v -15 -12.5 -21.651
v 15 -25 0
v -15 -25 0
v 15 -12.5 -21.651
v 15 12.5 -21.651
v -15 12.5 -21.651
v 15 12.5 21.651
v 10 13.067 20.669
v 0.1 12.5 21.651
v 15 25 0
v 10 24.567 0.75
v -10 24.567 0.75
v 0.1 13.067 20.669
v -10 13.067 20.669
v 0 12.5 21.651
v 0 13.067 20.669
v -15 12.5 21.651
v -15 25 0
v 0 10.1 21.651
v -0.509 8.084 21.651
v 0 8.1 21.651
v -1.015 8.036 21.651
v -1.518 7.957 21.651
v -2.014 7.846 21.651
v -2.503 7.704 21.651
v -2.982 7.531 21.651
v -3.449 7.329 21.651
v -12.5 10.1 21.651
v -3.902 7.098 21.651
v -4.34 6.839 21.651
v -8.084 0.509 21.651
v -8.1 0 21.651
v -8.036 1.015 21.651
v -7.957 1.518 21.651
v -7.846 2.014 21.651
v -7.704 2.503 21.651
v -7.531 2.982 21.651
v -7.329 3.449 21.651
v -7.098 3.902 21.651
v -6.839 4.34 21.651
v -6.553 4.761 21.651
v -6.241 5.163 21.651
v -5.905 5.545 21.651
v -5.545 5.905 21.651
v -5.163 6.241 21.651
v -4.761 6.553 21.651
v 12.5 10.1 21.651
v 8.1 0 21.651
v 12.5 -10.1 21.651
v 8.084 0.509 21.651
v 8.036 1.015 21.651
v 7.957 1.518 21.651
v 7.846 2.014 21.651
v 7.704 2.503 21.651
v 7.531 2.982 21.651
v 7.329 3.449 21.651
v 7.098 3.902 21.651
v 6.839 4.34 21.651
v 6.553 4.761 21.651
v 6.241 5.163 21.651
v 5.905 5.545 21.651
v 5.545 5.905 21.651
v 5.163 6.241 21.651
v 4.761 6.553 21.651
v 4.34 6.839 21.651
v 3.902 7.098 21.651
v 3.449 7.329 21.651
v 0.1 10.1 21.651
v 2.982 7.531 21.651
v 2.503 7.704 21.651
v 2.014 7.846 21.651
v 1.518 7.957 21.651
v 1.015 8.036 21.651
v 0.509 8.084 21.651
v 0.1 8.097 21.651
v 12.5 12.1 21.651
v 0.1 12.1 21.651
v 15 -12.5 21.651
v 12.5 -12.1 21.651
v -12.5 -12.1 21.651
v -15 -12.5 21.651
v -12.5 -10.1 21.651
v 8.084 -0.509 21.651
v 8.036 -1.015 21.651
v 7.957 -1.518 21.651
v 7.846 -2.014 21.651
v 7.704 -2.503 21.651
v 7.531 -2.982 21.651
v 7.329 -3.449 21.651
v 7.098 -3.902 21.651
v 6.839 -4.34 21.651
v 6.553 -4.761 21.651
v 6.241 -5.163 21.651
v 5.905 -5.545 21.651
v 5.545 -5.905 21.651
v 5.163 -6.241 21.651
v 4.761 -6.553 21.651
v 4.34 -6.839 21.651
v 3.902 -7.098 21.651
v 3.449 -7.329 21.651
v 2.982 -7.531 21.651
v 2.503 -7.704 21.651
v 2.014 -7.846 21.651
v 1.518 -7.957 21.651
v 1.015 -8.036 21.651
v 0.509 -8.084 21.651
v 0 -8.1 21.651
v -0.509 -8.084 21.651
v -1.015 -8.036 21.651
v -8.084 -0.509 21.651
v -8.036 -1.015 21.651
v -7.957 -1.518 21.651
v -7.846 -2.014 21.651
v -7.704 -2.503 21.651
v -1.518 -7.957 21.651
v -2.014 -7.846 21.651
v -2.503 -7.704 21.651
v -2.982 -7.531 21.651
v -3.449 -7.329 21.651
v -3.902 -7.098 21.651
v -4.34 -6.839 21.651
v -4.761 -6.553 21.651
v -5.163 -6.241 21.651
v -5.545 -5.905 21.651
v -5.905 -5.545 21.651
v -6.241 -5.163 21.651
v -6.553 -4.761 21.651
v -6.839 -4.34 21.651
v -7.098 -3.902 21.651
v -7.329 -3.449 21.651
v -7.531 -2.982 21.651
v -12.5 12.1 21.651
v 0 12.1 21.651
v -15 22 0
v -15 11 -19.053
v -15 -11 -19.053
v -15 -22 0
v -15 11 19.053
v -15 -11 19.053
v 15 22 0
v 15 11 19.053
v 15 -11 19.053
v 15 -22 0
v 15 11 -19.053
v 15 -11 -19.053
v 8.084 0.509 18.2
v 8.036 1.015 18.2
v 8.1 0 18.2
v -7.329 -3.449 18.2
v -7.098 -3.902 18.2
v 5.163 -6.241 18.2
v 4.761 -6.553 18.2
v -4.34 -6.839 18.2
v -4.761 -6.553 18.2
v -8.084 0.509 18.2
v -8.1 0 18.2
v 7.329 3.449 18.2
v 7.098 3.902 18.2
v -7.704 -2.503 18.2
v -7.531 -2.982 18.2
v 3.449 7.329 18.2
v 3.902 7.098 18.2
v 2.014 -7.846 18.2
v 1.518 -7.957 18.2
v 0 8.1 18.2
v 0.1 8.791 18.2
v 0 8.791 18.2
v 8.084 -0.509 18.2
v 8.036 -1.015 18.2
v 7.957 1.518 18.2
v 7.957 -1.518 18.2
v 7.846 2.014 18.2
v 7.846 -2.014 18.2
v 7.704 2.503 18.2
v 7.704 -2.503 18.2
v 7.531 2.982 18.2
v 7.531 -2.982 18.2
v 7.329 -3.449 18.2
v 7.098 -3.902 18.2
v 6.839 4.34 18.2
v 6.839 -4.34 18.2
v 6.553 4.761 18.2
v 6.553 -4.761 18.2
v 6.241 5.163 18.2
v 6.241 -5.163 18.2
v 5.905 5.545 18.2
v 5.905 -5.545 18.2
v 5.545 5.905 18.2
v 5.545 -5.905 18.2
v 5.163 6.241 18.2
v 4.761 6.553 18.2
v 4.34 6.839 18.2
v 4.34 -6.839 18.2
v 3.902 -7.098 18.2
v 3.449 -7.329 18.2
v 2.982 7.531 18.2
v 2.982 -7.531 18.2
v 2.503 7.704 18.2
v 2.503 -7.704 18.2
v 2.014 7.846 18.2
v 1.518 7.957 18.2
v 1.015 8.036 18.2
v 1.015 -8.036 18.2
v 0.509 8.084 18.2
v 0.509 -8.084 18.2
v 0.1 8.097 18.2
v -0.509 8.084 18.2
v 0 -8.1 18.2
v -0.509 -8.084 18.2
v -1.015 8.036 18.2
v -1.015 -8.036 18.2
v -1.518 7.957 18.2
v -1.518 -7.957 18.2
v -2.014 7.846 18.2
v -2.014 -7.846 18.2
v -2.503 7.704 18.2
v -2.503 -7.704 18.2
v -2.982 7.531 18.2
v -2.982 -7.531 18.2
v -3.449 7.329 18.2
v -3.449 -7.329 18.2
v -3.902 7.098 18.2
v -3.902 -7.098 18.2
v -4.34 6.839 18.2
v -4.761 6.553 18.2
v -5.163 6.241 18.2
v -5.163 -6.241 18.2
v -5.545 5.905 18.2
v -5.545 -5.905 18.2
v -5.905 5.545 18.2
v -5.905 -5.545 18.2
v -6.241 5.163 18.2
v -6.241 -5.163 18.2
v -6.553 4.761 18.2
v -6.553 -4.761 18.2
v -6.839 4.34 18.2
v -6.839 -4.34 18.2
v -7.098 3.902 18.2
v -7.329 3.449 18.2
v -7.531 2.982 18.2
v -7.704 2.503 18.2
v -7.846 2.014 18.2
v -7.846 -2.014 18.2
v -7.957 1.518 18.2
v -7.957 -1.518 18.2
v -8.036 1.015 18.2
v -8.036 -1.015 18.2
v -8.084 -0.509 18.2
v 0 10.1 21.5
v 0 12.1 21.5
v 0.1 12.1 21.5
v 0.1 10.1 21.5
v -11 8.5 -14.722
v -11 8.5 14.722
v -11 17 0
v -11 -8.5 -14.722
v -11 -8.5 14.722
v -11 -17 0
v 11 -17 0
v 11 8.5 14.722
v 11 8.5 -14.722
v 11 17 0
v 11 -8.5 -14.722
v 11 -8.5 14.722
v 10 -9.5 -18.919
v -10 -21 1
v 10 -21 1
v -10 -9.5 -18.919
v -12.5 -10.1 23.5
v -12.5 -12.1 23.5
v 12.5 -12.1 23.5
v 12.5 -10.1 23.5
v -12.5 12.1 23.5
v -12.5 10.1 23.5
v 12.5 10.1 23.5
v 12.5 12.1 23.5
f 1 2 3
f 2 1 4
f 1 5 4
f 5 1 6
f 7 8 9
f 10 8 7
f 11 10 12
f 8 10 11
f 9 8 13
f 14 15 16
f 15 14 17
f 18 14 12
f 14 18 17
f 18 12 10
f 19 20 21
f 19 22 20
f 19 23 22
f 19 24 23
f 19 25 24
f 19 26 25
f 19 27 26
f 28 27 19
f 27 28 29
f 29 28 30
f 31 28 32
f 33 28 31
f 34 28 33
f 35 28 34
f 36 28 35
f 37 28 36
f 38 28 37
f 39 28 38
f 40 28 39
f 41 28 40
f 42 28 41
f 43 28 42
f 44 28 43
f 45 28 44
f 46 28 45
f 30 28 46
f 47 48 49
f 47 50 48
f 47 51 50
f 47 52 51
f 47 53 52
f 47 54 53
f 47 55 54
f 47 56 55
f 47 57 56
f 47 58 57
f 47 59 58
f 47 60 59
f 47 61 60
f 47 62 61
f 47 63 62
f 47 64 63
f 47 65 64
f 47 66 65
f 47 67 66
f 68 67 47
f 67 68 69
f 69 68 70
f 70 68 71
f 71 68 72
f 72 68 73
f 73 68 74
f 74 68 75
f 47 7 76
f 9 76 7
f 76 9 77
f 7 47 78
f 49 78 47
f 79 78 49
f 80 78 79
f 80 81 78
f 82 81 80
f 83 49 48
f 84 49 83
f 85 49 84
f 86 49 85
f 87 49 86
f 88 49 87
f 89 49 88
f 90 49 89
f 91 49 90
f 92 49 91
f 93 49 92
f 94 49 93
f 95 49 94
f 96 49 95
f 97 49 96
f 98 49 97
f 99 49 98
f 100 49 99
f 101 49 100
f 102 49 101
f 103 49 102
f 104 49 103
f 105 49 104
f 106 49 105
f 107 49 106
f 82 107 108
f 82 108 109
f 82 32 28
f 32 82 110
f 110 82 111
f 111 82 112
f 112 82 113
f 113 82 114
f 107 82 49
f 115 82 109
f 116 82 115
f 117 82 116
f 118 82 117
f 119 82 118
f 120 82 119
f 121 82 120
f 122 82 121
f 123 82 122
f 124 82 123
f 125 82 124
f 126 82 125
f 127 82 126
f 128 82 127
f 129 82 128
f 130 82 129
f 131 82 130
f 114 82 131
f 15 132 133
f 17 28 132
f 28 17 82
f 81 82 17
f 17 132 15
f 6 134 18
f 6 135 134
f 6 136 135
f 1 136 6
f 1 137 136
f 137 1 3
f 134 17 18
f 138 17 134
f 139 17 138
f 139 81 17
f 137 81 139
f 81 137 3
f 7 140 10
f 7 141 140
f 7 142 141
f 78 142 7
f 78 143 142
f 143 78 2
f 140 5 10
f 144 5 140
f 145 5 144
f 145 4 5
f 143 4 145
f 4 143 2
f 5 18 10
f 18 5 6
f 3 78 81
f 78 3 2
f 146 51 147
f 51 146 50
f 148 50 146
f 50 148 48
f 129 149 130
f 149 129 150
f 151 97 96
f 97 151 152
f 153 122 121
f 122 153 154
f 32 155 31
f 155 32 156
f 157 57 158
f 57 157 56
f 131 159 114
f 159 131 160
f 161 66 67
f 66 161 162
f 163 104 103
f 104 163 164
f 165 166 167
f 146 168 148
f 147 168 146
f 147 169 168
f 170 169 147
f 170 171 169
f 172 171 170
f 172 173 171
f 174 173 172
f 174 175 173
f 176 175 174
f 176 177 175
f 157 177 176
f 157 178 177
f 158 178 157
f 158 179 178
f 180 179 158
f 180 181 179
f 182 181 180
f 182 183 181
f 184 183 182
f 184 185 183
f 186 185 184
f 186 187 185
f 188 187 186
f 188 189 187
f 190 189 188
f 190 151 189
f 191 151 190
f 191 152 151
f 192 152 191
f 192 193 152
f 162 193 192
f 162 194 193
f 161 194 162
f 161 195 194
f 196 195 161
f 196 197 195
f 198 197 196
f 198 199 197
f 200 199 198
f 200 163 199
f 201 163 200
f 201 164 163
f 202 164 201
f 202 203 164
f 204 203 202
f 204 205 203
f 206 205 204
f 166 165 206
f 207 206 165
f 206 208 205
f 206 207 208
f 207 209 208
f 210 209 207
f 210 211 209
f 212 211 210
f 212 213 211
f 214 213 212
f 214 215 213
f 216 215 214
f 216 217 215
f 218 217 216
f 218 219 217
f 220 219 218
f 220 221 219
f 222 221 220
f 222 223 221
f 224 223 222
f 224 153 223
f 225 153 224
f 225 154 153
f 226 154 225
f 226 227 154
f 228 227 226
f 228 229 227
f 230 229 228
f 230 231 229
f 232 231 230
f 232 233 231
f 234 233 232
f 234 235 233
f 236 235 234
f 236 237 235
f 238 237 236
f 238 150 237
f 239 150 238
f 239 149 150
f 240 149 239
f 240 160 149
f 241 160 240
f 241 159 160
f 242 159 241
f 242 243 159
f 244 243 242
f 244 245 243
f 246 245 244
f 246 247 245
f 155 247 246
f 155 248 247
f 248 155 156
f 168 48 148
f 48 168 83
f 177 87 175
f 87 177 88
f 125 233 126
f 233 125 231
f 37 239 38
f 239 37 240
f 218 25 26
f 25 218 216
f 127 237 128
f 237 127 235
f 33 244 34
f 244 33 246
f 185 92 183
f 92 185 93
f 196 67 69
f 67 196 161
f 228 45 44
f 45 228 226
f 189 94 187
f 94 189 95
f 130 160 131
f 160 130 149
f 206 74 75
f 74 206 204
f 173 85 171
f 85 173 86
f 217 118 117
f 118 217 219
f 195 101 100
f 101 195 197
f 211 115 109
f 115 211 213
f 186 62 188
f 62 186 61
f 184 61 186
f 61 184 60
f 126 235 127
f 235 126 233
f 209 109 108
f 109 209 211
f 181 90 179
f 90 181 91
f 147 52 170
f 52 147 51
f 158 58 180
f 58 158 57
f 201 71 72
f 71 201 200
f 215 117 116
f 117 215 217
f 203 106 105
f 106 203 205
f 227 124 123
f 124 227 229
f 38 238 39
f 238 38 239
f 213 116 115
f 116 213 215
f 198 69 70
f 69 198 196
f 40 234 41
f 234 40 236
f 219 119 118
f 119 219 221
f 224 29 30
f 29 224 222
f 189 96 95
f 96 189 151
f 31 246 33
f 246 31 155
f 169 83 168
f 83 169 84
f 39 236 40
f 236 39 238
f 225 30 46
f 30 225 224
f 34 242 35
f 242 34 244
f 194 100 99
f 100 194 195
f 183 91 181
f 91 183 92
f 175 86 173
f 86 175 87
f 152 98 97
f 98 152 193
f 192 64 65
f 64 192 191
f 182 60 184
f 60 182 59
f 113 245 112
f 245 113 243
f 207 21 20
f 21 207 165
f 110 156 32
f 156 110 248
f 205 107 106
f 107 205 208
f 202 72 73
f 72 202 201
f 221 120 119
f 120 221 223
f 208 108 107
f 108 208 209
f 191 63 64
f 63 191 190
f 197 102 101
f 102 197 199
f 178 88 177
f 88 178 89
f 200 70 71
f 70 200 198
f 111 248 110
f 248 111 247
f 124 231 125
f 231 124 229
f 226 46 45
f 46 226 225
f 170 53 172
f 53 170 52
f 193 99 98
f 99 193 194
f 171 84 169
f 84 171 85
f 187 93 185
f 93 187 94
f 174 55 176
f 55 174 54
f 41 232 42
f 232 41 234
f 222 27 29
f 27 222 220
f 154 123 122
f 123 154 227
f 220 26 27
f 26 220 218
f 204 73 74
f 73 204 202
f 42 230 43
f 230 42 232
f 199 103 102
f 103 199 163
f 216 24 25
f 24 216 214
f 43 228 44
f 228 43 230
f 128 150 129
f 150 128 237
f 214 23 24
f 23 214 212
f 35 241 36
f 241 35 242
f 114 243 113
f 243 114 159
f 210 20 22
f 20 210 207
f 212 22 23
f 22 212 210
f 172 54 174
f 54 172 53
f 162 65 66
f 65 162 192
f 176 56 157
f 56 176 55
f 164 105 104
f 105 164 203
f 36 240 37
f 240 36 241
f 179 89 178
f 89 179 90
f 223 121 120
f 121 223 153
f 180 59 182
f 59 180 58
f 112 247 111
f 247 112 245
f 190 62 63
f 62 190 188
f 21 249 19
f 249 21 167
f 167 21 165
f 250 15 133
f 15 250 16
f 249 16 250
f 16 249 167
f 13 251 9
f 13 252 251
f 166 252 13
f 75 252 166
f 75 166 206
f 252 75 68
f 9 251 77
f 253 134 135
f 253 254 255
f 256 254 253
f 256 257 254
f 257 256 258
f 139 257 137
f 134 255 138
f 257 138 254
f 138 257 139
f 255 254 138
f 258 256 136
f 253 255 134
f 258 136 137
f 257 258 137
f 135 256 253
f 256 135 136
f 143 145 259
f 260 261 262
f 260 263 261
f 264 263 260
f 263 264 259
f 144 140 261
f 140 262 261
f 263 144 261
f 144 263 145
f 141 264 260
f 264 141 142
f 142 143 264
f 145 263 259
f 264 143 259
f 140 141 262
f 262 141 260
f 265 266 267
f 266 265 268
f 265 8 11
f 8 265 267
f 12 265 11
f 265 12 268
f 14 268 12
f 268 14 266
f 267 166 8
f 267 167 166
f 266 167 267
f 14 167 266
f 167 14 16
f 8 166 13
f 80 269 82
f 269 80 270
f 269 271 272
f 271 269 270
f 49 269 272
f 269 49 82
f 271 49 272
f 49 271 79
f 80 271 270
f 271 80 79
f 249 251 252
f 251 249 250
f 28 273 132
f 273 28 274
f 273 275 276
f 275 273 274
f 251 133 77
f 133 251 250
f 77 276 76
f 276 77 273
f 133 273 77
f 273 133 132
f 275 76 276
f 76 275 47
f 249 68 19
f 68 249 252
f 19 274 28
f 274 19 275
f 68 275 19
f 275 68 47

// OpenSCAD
translate([0,-11.1,21.5]) linear_extrude(2) square([25,2],center=true);
translate([0,11.1,21.5]) linear_extrude(2) square([25,2],center=true);
difference() {
    rotate([30,0,0]) translate([-15,0,0]) rotate([0,90,0]) cylinder(30,25,25,$fn=6);
    // 磁石
    translate([0,0,18.2]) linear_extrude(3.5) circle(8.1,$fn=100);
    // 溝
    translate([0,0,18.2]) linear_extrude(3.5) square([0.1,30]);
    // 飾り
    rotate([30,0,0]) translate([-15,0,0]) rotate([0,90,0]) cylinder(4,22,17,$fn=6);
    rotate([30,0,0]) translate([11,0,0]) rotate([0,90,0]) cylinder(4,17,22,$fn=6);
    translate([-10,-21,1]) rotate([300,0,0]) linear_extrude(45) square([20,23]);
}
